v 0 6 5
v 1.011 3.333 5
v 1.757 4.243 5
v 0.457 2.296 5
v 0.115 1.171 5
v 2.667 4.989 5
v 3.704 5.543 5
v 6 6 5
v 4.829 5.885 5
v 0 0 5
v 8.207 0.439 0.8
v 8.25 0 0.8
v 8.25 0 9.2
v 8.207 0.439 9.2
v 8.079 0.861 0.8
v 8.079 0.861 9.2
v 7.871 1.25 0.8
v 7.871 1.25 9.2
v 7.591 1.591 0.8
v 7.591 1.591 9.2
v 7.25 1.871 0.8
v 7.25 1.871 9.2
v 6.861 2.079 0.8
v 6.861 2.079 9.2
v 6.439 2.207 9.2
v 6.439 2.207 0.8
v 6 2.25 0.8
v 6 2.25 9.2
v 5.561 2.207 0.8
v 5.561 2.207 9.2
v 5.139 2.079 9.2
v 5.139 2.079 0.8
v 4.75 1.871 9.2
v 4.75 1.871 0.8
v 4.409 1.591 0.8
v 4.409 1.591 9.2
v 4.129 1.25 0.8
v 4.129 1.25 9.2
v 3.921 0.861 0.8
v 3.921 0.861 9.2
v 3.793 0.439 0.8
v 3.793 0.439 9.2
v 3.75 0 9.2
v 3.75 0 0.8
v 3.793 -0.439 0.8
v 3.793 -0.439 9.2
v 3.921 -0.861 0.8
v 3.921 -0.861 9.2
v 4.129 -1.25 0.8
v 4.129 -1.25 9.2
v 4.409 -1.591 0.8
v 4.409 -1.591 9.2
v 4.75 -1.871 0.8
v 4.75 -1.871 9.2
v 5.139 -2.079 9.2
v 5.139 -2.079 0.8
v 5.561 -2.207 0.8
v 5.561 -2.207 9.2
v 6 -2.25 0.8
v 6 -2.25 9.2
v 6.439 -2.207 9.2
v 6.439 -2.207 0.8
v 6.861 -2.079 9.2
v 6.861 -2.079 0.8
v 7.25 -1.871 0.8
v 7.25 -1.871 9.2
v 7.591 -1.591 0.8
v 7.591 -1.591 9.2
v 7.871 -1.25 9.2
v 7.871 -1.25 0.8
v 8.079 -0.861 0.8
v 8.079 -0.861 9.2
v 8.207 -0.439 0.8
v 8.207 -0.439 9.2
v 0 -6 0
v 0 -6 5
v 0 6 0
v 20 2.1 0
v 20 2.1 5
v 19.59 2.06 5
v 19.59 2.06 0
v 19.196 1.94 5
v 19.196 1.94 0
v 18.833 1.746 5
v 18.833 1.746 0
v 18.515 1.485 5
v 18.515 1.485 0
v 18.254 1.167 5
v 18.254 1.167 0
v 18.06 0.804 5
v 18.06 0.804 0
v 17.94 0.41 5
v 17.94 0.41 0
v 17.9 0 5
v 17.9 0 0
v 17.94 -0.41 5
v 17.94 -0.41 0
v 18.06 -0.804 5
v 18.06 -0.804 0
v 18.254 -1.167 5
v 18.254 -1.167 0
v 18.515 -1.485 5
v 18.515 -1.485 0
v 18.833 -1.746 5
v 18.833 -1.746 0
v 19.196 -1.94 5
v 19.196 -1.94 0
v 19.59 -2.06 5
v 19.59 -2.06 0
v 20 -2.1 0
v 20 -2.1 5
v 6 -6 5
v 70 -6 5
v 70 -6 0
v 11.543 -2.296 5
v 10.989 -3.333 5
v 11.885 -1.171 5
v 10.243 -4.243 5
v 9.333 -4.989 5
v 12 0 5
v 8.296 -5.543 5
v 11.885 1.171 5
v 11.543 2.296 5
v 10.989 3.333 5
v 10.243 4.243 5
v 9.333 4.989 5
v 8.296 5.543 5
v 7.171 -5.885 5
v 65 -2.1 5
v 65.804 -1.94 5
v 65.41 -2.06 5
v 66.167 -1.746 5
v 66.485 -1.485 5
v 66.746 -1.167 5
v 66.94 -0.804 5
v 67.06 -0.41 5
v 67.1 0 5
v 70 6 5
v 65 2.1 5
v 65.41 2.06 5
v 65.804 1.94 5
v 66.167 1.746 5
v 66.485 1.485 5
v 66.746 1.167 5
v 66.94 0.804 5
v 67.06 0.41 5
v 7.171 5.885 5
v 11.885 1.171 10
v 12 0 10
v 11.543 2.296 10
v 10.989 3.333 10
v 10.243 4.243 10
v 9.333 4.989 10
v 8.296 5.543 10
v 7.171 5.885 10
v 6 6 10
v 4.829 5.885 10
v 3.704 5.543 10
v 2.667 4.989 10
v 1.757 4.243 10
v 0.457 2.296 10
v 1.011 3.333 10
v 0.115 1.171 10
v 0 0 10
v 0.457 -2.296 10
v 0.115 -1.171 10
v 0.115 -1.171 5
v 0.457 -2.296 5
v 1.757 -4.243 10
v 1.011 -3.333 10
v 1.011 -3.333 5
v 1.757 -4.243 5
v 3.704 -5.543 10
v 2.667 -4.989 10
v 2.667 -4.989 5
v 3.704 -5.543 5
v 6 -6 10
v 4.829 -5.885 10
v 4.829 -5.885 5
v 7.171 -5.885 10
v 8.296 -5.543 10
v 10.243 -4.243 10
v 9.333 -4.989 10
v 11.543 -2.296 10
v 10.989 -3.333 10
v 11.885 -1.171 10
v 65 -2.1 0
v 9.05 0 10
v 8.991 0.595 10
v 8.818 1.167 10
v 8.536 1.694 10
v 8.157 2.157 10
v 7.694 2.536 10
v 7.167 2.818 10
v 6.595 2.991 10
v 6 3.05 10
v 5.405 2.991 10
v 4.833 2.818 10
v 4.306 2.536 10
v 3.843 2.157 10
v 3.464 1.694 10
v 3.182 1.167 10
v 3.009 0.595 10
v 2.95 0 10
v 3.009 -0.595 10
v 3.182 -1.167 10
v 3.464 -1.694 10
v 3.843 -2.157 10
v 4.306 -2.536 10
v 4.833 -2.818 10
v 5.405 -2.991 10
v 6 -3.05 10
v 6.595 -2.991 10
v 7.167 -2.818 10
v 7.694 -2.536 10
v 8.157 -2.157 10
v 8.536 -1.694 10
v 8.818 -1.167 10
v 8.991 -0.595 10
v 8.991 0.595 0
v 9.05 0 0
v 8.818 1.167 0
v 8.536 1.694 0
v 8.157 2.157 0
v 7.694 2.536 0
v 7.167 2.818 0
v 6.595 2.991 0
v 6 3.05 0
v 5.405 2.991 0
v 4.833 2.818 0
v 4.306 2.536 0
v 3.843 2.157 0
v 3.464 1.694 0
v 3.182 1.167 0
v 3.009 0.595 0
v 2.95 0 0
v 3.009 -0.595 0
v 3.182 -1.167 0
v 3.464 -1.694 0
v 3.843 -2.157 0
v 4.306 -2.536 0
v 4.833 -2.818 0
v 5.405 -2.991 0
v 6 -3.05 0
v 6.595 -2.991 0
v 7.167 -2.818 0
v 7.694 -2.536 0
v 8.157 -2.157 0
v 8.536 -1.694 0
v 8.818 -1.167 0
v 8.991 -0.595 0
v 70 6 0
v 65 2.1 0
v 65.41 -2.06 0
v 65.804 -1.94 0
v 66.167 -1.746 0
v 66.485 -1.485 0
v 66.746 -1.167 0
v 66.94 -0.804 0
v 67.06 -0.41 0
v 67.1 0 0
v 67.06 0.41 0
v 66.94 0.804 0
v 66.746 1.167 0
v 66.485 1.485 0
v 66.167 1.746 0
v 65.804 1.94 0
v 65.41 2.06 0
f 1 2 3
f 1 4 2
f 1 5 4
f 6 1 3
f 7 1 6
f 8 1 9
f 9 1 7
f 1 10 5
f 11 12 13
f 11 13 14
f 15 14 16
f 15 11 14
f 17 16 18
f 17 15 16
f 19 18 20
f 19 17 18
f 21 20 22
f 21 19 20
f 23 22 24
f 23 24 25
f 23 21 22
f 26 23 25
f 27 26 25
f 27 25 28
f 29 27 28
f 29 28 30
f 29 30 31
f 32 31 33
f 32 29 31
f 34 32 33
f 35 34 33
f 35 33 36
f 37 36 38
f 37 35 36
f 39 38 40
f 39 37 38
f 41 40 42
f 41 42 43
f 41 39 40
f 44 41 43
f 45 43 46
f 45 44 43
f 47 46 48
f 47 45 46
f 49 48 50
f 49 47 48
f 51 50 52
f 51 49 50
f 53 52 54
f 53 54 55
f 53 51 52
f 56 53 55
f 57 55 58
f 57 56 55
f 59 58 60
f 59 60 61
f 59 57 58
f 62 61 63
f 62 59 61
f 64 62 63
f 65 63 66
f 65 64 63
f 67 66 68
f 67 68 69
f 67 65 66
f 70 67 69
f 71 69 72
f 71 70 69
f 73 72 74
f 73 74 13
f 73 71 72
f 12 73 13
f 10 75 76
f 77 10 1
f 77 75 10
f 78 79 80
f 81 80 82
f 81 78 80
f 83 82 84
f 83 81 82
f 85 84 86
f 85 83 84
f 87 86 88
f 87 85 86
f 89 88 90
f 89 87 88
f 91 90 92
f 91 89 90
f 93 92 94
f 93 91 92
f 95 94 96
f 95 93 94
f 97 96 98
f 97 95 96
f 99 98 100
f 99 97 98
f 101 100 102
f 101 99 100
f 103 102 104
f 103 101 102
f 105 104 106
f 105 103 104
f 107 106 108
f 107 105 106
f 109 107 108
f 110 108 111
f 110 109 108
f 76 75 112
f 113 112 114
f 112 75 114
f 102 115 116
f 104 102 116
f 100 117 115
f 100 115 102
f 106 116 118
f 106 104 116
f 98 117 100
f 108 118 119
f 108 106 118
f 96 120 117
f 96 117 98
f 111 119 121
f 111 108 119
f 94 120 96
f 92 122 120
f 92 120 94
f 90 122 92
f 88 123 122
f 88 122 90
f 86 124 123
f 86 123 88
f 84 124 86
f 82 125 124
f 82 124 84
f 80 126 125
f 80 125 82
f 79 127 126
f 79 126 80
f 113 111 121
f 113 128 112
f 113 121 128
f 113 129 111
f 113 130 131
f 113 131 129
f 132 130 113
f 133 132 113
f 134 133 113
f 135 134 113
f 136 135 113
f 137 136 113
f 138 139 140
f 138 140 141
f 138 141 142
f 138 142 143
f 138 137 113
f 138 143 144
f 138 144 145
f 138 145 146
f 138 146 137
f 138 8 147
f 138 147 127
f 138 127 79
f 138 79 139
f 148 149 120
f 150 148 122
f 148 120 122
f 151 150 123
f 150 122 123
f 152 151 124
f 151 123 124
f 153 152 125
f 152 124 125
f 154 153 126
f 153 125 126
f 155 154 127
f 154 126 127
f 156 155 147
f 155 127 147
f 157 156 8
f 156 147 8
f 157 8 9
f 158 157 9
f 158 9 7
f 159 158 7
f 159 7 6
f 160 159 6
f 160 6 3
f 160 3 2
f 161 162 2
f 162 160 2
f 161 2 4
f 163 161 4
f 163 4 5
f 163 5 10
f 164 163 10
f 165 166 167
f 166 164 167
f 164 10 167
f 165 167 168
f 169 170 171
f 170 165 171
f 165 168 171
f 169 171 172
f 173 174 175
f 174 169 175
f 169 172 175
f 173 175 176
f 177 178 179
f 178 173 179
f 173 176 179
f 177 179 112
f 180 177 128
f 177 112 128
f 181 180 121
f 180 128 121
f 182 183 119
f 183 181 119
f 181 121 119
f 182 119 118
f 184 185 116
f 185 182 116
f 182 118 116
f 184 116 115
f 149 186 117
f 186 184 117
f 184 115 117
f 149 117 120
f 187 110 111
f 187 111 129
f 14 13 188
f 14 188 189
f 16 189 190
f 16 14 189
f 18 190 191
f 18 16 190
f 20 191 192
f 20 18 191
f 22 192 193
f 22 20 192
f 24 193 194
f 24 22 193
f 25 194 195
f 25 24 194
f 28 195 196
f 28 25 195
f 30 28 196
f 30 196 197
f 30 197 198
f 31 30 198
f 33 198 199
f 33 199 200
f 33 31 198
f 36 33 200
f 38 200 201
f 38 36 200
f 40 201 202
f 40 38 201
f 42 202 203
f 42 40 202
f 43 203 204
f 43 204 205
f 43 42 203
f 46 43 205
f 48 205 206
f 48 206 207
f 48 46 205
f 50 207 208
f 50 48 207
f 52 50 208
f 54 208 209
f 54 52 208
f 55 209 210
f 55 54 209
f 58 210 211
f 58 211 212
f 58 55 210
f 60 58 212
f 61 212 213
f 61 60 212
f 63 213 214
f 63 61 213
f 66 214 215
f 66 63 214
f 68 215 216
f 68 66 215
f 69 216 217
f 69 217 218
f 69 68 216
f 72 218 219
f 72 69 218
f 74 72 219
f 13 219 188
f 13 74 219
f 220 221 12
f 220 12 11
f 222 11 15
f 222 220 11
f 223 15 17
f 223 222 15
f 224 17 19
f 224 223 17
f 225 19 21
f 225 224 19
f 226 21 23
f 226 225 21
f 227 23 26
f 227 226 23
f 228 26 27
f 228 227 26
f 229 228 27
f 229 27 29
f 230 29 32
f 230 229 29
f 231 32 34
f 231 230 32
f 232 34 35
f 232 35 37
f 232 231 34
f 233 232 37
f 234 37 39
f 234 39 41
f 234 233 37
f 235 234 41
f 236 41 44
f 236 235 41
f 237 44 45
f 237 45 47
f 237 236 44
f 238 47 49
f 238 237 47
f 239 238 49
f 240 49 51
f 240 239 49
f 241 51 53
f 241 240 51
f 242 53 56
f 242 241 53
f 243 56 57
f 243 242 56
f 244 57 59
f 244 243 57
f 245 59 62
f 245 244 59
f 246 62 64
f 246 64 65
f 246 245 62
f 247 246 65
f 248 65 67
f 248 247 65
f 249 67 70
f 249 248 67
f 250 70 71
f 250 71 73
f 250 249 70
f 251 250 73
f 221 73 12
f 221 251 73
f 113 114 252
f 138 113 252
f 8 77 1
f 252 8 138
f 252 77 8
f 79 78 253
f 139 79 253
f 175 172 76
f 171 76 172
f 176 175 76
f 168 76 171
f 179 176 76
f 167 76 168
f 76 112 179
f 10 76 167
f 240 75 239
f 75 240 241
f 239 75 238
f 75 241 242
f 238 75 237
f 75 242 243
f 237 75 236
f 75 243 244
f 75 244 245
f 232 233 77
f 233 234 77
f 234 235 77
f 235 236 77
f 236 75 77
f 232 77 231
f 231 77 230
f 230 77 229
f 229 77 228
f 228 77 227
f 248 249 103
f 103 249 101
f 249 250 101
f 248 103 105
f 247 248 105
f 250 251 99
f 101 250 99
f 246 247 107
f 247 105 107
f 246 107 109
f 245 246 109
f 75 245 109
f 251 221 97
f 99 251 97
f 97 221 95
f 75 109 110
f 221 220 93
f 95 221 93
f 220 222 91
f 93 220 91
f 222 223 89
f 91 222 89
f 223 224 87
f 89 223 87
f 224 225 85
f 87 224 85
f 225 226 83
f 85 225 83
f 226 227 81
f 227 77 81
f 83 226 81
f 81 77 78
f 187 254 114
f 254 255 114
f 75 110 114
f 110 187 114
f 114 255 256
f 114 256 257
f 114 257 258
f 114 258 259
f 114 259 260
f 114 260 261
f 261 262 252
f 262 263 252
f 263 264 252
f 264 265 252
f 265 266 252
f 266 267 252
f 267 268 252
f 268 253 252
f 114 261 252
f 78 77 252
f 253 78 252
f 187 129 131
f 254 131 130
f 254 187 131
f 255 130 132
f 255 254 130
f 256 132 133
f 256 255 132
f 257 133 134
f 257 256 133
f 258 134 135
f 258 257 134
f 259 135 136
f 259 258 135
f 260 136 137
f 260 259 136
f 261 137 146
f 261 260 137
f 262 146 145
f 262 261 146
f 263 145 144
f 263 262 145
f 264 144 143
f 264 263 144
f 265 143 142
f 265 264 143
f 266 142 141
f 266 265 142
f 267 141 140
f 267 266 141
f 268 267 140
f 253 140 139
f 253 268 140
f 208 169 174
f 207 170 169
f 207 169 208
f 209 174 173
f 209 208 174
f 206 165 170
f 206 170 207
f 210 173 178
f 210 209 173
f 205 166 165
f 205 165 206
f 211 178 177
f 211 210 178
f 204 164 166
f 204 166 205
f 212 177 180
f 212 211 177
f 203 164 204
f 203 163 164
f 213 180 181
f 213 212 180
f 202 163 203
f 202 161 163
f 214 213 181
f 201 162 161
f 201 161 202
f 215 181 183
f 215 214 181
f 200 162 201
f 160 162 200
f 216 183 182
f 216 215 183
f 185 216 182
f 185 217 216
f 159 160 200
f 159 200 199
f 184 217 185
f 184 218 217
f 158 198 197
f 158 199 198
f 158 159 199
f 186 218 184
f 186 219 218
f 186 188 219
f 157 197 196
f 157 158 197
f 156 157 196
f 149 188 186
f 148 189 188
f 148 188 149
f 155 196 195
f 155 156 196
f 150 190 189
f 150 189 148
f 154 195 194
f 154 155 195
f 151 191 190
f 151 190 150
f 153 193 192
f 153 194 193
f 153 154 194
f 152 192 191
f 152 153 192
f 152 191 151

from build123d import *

# Parameters (mm, degrees)
SKETCH001_W      = 90
SKETCH001_H      = 20
SKETCH001_R      = 6
EXTRUDE001_DEPTH = 5
SKETCH_W         = 70
SKETCH_H         = 12
SKETCH_R         = 2.25
EXTRUDE_DEPTH    = 10
CHAMFER_SIZE     = 0.8


with BuildPart() as extrude001:
    # Sketch001 → Extrude001 (new body)
    with BuildSketch(Plane.XY):
        with Locations((38, 0)):
            Rectangle(SKETCH001_W, SKETCH001_H)
        with Locations((6, 0)):
            Circle(SKETCH001_R, mode=Mode.SUBTRACT)
    extrude(amount=EXTRUDE001_DEPTH)


with BuildPart() as extrude001_1:
    # Extrude001 placement: moved
    add(extrude001.part.moved(Location((0, 0, 5))))


with BuildPart() as chamfer_body:
    # Sketch → Extrude (new body)
    with BuildSketch(Plane.XY):
        with Locations((35, 0)):
            Rectangle(SKETCH_W, SKETCH_H)
        with Locations((6, 0)):
            Circle(SKETCH_R, mode=Mode.SUBTRACT)
        with BuildLine():
            ThreePointArc((20, 2.1), (17.9, 0), (20, -2.1))
            Line((20, -2.1), (65, -2.1))
            ThreePointArc((65, -2.1), (67.1, 0), (65, 2.1))
            Line((20, 2.1), (65, 2.1))
        make_face(mode=Mode.SUBTRACT)
    extrude(amount=EXTRUDE_DEPTH)

    # Cut: cut Extrude001
    add(extrude001_1.part, mode=Mode.SUBTRACT)

    # Chamfer
    chamfer_edges = [chamfer_body.edges().sort_by_distance(p)[0] for p in [
        (3.75, 0, 0),
        (3.75, 0, 10),
    ]]
    chamfer(chamfer_edges, length=CHAMFER_SIZE)


solid = chamfer_body.part
